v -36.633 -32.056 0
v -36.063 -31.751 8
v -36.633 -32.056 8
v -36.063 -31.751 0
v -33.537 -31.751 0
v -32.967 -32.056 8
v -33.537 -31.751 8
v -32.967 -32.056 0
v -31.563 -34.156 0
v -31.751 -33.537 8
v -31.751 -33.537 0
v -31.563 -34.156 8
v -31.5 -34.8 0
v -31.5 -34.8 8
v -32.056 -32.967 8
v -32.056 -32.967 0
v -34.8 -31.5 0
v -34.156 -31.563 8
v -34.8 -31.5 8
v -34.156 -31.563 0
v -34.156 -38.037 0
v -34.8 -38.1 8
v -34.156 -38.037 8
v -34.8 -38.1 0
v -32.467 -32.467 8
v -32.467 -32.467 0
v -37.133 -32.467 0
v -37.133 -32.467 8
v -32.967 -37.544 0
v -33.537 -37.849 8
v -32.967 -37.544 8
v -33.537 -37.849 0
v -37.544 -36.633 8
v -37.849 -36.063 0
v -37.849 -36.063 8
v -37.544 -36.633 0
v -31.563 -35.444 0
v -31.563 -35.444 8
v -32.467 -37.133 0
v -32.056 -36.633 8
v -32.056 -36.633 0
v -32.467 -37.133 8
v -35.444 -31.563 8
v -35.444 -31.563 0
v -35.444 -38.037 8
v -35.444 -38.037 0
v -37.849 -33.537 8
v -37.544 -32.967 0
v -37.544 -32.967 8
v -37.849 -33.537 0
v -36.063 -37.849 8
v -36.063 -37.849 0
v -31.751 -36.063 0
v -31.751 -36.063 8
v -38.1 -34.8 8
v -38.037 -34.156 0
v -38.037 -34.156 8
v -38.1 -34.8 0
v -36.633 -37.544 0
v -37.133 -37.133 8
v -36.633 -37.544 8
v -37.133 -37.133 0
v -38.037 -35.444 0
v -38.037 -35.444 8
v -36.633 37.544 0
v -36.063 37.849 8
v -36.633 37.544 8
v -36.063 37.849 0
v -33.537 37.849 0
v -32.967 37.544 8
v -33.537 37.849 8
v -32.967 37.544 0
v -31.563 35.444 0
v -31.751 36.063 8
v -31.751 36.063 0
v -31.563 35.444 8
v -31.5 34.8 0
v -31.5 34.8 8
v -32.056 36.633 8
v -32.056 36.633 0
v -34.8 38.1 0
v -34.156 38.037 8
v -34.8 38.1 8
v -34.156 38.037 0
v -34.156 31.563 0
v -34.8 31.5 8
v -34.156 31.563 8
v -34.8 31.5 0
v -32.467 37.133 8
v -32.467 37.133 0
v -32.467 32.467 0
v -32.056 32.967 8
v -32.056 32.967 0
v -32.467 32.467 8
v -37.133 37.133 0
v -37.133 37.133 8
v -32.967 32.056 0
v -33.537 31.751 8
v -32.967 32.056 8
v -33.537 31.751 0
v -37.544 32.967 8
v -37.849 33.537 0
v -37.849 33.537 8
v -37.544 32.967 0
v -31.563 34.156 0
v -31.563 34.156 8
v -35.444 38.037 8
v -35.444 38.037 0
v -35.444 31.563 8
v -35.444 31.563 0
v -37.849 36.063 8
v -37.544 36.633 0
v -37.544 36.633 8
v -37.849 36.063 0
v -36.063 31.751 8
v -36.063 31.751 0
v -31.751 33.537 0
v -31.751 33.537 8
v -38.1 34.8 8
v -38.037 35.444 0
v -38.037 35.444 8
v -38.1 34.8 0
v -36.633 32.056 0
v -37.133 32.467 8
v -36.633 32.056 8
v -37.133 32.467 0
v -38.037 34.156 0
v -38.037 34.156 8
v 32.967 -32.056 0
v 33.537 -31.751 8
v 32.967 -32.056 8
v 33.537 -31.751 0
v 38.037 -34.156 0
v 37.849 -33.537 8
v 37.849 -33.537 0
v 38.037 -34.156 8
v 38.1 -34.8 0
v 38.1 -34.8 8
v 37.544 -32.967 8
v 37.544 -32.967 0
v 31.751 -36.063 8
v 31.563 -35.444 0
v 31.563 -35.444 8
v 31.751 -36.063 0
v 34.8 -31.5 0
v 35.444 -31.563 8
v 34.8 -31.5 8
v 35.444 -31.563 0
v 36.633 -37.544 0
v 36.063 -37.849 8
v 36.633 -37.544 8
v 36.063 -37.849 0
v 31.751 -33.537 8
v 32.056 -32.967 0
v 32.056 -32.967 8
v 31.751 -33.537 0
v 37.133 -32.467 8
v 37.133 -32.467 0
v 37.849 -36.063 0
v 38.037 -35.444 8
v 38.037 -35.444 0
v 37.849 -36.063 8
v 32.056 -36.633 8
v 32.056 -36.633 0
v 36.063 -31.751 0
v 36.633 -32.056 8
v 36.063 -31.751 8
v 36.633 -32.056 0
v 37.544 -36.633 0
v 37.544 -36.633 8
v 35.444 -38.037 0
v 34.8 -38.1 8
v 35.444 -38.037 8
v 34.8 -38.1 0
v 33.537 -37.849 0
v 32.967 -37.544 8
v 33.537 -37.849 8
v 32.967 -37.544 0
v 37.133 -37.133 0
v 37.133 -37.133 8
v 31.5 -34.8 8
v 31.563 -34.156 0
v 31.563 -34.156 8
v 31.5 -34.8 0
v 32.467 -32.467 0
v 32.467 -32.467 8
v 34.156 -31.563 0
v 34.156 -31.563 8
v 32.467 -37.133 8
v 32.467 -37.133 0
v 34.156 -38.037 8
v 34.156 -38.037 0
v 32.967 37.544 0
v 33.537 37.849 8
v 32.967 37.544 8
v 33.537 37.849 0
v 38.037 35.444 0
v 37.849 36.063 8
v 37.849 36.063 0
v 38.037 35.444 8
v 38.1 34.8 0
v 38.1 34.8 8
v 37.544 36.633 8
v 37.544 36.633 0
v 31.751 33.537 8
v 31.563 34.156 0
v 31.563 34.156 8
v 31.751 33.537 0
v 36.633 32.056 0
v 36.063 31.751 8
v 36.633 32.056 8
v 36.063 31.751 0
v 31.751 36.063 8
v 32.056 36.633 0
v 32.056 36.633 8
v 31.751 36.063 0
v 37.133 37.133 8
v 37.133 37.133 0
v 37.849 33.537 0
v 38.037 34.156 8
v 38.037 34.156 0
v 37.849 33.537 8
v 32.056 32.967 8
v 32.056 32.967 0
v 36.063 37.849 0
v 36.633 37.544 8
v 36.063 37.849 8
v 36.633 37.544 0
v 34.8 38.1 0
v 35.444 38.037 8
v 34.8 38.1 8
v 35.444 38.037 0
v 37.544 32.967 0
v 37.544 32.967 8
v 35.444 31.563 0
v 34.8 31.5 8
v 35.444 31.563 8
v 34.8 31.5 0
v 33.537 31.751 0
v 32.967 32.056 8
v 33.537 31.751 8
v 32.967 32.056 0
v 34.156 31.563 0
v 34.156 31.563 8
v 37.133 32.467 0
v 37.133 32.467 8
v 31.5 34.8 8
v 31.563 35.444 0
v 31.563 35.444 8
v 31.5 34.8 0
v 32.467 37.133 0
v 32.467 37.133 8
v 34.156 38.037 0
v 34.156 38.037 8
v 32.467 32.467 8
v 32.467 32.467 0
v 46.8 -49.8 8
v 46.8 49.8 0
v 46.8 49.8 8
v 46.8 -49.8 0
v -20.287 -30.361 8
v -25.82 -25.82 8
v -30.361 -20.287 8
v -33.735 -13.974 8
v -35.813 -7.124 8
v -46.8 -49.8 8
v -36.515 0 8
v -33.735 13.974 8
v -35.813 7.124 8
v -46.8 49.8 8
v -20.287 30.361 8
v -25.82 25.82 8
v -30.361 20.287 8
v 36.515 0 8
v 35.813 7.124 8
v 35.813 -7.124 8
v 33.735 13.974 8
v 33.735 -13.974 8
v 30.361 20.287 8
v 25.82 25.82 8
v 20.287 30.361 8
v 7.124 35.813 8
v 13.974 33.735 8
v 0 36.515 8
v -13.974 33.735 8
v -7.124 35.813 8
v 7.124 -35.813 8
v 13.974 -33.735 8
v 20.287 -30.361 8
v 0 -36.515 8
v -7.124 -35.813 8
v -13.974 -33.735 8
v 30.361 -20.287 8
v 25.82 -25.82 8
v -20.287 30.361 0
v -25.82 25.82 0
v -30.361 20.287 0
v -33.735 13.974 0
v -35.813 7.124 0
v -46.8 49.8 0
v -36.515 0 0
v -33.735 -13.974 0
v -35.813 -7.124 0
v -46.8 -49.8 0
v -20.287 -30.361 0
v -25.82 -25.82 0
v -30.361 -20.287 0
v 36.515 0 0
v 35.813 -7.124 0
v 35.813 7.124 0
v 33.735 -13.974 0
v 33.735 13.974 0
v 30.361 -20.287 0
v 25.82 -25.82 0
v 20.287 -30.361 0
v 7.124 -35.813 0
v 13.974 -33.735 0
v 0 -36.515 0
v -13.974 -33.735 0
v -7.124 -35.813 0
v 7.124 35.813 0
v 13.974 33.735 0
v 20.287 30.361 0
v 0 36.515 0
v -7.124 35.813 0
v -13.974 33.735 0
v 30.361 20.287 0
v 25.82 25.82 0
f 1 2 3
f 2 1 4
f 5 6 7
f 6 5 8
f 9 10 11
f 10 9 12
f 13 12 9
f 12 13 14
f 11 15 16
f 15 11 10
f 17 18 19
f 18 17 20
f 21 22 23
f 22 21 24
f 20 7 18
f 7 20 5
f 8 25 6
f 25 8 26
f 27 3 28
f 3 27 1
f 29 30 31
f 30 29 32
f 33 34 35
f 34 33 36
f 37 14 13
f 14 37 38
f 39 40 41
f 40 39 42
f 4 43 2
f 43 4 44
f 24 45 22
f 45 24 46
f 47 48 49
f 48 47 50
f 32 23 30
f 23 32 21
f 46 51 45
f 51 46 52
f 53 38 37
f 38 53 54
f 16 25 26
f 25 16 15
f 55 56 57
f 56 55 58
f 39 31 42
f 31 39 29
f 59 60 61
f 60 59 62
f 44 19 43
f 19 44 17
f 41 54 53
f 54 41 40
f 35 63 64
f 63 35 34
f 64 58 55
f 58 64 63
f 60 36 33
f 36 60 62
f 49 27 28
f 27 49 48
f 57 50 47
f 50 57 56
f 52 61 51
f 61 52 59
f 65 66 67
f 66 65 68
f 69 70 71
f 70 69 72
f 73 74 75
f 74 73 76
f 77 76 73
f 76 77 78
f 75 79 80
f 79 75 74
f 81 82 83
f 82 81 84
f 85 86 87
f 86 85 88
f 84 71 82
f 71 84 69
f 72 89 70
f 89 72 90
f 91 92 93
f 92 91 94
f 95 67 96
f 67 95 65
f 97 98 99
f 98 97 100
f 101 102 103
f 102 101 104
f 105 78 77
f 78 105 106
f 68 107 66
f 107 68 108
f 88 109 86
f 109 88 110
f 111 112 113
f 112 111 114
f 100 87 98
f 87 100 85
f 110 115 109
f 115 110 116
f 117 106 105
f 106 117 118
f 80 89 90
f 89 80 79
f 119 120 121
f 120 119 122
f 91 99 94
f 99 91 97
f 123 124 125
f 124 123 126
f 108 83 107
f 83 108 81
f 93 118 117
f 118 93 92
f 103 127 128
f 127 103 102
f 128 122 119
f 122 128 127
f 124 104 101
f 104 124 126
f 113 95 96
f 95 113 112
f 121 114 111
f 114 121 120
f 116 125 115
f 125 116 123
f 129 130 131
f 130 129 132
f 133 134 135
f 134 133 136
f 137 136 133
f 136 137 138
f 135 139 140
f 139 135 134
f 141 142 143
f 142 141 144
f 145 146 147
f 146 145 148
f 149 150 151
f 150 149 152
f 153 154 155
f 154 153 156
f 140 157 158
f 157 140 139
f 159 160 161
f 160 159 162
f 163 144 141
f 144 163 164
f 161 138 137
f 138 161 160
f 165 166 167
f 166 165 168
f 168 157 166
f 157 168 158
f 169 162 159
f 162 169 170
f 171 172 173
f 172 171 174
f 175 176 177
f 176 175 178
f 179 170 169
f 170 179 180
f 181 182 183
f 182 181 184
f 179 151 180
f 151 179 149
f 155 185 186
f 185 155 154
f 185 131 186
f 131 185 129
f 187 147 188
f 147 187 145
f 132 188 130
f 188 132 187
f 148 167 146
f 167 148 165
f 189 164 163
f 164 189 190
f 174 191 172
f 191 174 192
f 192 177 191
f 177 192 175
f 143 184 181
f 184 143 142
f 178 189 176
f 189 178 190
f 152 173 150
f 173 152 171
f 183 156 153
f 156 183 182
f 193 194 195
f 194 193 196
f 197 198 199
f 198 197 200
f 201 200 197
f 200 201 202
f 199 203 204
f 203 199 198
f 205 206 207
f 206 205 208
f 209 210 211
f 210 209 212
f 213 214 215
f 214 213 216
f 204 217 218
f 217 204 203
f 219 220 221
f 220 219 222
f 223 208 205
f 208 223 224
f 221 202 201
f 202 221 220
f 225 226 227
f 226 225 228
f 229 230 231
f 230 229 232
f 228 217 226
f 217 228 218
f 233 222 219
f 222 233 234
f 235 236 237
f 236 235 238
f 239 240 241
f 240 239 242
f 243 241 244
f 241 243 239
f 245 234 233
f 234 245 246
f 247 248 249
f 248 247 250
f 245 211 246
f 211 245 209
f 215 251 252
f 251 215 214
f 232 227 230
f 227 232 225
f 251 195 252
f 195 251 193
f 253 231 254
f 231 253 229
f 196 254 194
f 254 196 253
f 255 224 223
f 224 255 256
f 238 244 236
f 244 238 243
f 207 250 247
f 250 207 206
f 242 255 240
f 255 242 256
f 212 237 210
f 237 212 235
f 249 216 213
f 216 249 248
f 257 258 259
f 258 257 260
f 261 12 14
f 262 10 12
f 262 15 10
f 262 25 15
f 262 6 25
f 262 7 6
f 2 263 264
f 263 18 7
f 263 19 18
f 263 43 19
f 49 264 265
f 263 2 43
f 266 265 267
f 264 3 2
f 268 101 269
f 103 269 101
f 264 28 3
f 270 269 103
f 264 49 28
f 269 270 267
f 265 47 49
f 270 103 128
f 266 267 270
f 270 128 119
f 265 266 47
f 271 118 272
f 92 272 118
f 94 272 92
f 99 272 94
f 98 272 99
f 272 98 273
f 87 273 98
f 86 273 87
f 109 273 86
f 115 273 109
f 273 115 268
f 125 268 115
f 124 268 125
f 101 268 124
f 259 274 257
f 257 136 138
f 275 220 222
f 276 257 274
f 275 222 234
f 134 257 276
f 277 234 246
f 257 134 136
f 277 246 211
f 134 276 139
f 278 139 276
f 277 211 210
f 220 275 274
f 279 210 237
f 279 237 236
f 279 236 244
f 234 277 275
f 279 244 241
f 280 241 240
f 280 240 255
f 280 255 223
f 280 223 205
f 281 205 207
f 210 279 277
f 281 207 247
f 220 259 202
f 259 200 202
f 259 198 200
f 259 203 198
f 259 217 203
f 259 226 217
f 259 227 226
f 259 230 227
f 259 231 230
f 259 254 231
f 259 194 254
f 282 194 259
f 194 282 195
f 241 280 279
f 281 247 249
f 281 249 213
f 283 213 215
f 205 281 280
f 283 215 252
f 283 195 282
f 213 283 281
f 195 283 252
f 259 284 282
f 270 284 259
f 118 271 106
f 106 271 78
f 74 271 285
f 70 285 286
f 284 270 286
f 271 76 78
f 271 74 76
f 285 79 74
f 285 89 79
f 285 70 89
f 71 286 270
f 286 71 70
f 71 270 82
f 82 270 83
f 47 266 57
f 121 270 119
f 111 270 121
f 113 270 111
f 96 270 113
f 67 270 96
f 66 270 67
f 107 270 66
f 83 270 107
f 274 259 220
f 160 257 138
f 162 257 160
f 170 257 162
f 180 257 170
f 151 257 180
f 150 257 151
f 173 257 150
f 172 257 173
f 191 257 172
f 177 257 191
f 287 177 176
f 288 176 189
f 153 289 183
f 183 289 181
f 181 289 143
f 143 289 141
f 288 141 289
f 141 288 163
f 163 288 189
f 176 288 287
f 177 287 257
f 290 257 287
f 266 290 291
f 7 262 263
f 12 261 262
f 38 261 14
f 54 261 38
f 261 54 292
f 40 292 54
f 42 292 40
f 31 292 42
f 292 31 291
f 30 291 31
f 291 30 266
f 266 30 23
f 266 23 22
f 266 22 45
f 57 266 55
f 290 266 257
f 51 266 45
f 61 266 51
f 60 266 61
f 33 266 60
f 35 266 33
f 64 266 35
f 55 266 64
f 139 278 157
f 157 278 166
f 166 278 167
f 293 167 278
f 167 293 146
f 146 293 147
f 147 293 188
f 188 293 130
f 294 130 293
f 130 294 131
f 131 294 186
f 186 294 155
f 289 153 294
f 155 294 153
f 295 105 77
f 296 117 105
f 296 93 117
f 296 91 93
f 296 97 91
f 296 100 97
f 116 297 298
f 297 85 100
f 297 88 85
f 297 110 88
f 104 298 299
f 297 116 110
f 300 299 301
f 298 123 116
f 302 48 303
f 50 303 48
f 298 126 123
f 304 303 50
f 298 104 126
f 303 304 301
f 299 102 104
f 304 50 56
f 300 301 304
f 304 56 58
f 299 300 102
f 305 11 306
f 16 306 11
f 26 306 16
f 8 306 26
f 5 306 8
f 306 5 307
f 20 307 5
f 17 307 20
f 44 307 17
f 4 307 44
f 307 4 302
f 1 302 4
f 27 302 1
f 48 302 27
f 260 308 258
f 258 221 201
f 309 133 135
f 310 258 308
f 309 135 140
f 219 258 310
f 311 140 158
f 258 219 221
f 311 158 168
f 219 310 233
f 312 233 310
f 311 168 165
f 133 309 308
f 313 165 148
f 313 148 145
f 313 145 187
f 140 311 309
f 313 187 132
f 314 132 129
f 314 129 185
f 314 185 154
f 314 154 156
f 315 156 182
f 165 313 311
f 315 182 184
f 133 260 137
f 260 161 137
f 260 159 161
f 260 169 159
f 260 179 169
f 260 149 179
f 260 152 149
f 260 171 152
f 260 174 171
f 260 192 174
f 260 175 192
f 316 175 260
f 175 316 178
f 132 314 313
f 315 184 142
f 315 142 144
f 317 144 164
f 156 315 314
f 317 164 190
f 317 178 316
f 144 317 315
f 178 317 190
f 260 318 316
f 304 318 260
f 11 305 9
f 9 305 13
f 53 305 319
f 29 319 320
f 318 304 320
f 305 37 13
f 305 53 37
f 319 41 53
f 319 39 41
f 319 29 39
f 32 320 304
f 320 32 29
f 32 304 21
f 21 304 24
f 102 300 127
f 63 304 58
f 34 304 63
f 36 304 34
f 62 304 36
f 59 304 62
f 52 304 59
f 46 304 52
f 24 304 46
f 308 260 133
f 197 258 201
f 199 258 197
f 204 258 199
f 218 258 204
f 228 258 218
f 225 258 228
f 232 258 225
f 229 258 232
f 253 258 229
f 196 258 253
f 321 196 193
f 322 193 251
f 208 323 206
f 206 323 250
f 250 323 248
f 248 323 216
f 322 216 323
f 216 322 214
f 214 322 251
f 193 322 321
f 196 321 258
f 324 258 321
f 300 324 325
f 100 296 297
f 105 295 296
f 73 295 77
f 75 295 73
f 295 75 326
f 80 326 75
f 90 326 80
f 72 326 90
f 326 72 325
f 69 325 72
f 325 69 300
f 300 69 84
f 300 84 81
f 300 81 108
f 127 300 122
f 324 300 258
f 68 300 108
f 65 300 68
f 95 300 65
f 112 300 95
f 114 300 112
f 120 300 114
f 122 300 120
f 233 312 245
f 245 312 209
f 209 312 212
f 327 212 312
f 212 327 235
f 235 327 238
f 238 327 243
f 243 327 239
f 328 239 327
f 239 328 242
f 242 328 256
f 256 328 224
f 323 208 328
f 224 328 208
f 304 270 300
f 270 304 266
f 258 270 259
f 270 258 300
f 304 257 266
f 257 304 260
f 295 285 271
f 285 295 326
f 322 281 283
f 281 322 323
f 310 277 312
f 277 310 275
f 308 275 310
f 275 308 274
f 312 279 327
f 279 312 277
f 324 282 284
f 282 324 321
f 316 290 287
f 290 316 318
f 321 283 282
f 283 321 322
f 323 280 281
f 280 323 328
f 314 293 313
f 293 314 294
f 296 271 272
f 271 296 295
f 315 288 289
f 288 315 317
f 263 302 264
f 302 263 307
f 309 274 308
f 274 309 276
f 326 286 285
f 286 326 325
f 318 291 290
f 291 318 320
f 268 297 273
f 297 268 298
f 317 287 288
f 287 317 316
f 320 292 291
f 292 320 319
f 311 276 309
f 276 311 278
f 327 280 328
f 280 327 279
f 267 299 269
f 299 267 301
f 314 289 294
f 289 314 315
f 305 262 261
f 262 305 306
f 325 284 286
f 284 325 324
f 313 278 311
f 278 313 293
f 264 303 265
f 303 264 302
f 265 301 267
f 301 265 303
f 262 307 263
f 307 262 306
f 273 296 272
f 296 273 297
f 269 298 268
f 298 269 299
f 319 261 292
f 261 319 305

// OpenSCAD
$fn = 32;

// ----------------------------------------------------------------------
// Motor mount plate: NEMA34, 93.6 x 99.6 x 8 mm
// ----------------------------------------------------------------------

// --- parameters (mm) ---
base_x = 93.6;            // plate length, X
base_y = 99.6;            // plate width, Y
thick = 8;                // plate thickness
bolt_pitch = 69.6;        // NEMA34 bolt spacing
motor_d = 6.6;            // NEMA34 screw clearance
boss_hole = 73.03;        // pilot boss bore

module plate() {
  translate([-base_x / 2, -base_y / 2, 0]) cube([base_x, base_y, thick]);
}

module motor_holes() {
  for (sx = [-1, 1]) for (sy = [-1, 1])
    translate([sx * bolt_pitch / 2, sy * bolt_pitch / 2, -1])
      cylinder(h = thick + 2, d = motor_d);
}

difference() {
  union() {
    plate();
  }
  motor_holes();
  translate([0, 0, -1]) cylinder(h = thick + 2, d = boss_hole);
}
